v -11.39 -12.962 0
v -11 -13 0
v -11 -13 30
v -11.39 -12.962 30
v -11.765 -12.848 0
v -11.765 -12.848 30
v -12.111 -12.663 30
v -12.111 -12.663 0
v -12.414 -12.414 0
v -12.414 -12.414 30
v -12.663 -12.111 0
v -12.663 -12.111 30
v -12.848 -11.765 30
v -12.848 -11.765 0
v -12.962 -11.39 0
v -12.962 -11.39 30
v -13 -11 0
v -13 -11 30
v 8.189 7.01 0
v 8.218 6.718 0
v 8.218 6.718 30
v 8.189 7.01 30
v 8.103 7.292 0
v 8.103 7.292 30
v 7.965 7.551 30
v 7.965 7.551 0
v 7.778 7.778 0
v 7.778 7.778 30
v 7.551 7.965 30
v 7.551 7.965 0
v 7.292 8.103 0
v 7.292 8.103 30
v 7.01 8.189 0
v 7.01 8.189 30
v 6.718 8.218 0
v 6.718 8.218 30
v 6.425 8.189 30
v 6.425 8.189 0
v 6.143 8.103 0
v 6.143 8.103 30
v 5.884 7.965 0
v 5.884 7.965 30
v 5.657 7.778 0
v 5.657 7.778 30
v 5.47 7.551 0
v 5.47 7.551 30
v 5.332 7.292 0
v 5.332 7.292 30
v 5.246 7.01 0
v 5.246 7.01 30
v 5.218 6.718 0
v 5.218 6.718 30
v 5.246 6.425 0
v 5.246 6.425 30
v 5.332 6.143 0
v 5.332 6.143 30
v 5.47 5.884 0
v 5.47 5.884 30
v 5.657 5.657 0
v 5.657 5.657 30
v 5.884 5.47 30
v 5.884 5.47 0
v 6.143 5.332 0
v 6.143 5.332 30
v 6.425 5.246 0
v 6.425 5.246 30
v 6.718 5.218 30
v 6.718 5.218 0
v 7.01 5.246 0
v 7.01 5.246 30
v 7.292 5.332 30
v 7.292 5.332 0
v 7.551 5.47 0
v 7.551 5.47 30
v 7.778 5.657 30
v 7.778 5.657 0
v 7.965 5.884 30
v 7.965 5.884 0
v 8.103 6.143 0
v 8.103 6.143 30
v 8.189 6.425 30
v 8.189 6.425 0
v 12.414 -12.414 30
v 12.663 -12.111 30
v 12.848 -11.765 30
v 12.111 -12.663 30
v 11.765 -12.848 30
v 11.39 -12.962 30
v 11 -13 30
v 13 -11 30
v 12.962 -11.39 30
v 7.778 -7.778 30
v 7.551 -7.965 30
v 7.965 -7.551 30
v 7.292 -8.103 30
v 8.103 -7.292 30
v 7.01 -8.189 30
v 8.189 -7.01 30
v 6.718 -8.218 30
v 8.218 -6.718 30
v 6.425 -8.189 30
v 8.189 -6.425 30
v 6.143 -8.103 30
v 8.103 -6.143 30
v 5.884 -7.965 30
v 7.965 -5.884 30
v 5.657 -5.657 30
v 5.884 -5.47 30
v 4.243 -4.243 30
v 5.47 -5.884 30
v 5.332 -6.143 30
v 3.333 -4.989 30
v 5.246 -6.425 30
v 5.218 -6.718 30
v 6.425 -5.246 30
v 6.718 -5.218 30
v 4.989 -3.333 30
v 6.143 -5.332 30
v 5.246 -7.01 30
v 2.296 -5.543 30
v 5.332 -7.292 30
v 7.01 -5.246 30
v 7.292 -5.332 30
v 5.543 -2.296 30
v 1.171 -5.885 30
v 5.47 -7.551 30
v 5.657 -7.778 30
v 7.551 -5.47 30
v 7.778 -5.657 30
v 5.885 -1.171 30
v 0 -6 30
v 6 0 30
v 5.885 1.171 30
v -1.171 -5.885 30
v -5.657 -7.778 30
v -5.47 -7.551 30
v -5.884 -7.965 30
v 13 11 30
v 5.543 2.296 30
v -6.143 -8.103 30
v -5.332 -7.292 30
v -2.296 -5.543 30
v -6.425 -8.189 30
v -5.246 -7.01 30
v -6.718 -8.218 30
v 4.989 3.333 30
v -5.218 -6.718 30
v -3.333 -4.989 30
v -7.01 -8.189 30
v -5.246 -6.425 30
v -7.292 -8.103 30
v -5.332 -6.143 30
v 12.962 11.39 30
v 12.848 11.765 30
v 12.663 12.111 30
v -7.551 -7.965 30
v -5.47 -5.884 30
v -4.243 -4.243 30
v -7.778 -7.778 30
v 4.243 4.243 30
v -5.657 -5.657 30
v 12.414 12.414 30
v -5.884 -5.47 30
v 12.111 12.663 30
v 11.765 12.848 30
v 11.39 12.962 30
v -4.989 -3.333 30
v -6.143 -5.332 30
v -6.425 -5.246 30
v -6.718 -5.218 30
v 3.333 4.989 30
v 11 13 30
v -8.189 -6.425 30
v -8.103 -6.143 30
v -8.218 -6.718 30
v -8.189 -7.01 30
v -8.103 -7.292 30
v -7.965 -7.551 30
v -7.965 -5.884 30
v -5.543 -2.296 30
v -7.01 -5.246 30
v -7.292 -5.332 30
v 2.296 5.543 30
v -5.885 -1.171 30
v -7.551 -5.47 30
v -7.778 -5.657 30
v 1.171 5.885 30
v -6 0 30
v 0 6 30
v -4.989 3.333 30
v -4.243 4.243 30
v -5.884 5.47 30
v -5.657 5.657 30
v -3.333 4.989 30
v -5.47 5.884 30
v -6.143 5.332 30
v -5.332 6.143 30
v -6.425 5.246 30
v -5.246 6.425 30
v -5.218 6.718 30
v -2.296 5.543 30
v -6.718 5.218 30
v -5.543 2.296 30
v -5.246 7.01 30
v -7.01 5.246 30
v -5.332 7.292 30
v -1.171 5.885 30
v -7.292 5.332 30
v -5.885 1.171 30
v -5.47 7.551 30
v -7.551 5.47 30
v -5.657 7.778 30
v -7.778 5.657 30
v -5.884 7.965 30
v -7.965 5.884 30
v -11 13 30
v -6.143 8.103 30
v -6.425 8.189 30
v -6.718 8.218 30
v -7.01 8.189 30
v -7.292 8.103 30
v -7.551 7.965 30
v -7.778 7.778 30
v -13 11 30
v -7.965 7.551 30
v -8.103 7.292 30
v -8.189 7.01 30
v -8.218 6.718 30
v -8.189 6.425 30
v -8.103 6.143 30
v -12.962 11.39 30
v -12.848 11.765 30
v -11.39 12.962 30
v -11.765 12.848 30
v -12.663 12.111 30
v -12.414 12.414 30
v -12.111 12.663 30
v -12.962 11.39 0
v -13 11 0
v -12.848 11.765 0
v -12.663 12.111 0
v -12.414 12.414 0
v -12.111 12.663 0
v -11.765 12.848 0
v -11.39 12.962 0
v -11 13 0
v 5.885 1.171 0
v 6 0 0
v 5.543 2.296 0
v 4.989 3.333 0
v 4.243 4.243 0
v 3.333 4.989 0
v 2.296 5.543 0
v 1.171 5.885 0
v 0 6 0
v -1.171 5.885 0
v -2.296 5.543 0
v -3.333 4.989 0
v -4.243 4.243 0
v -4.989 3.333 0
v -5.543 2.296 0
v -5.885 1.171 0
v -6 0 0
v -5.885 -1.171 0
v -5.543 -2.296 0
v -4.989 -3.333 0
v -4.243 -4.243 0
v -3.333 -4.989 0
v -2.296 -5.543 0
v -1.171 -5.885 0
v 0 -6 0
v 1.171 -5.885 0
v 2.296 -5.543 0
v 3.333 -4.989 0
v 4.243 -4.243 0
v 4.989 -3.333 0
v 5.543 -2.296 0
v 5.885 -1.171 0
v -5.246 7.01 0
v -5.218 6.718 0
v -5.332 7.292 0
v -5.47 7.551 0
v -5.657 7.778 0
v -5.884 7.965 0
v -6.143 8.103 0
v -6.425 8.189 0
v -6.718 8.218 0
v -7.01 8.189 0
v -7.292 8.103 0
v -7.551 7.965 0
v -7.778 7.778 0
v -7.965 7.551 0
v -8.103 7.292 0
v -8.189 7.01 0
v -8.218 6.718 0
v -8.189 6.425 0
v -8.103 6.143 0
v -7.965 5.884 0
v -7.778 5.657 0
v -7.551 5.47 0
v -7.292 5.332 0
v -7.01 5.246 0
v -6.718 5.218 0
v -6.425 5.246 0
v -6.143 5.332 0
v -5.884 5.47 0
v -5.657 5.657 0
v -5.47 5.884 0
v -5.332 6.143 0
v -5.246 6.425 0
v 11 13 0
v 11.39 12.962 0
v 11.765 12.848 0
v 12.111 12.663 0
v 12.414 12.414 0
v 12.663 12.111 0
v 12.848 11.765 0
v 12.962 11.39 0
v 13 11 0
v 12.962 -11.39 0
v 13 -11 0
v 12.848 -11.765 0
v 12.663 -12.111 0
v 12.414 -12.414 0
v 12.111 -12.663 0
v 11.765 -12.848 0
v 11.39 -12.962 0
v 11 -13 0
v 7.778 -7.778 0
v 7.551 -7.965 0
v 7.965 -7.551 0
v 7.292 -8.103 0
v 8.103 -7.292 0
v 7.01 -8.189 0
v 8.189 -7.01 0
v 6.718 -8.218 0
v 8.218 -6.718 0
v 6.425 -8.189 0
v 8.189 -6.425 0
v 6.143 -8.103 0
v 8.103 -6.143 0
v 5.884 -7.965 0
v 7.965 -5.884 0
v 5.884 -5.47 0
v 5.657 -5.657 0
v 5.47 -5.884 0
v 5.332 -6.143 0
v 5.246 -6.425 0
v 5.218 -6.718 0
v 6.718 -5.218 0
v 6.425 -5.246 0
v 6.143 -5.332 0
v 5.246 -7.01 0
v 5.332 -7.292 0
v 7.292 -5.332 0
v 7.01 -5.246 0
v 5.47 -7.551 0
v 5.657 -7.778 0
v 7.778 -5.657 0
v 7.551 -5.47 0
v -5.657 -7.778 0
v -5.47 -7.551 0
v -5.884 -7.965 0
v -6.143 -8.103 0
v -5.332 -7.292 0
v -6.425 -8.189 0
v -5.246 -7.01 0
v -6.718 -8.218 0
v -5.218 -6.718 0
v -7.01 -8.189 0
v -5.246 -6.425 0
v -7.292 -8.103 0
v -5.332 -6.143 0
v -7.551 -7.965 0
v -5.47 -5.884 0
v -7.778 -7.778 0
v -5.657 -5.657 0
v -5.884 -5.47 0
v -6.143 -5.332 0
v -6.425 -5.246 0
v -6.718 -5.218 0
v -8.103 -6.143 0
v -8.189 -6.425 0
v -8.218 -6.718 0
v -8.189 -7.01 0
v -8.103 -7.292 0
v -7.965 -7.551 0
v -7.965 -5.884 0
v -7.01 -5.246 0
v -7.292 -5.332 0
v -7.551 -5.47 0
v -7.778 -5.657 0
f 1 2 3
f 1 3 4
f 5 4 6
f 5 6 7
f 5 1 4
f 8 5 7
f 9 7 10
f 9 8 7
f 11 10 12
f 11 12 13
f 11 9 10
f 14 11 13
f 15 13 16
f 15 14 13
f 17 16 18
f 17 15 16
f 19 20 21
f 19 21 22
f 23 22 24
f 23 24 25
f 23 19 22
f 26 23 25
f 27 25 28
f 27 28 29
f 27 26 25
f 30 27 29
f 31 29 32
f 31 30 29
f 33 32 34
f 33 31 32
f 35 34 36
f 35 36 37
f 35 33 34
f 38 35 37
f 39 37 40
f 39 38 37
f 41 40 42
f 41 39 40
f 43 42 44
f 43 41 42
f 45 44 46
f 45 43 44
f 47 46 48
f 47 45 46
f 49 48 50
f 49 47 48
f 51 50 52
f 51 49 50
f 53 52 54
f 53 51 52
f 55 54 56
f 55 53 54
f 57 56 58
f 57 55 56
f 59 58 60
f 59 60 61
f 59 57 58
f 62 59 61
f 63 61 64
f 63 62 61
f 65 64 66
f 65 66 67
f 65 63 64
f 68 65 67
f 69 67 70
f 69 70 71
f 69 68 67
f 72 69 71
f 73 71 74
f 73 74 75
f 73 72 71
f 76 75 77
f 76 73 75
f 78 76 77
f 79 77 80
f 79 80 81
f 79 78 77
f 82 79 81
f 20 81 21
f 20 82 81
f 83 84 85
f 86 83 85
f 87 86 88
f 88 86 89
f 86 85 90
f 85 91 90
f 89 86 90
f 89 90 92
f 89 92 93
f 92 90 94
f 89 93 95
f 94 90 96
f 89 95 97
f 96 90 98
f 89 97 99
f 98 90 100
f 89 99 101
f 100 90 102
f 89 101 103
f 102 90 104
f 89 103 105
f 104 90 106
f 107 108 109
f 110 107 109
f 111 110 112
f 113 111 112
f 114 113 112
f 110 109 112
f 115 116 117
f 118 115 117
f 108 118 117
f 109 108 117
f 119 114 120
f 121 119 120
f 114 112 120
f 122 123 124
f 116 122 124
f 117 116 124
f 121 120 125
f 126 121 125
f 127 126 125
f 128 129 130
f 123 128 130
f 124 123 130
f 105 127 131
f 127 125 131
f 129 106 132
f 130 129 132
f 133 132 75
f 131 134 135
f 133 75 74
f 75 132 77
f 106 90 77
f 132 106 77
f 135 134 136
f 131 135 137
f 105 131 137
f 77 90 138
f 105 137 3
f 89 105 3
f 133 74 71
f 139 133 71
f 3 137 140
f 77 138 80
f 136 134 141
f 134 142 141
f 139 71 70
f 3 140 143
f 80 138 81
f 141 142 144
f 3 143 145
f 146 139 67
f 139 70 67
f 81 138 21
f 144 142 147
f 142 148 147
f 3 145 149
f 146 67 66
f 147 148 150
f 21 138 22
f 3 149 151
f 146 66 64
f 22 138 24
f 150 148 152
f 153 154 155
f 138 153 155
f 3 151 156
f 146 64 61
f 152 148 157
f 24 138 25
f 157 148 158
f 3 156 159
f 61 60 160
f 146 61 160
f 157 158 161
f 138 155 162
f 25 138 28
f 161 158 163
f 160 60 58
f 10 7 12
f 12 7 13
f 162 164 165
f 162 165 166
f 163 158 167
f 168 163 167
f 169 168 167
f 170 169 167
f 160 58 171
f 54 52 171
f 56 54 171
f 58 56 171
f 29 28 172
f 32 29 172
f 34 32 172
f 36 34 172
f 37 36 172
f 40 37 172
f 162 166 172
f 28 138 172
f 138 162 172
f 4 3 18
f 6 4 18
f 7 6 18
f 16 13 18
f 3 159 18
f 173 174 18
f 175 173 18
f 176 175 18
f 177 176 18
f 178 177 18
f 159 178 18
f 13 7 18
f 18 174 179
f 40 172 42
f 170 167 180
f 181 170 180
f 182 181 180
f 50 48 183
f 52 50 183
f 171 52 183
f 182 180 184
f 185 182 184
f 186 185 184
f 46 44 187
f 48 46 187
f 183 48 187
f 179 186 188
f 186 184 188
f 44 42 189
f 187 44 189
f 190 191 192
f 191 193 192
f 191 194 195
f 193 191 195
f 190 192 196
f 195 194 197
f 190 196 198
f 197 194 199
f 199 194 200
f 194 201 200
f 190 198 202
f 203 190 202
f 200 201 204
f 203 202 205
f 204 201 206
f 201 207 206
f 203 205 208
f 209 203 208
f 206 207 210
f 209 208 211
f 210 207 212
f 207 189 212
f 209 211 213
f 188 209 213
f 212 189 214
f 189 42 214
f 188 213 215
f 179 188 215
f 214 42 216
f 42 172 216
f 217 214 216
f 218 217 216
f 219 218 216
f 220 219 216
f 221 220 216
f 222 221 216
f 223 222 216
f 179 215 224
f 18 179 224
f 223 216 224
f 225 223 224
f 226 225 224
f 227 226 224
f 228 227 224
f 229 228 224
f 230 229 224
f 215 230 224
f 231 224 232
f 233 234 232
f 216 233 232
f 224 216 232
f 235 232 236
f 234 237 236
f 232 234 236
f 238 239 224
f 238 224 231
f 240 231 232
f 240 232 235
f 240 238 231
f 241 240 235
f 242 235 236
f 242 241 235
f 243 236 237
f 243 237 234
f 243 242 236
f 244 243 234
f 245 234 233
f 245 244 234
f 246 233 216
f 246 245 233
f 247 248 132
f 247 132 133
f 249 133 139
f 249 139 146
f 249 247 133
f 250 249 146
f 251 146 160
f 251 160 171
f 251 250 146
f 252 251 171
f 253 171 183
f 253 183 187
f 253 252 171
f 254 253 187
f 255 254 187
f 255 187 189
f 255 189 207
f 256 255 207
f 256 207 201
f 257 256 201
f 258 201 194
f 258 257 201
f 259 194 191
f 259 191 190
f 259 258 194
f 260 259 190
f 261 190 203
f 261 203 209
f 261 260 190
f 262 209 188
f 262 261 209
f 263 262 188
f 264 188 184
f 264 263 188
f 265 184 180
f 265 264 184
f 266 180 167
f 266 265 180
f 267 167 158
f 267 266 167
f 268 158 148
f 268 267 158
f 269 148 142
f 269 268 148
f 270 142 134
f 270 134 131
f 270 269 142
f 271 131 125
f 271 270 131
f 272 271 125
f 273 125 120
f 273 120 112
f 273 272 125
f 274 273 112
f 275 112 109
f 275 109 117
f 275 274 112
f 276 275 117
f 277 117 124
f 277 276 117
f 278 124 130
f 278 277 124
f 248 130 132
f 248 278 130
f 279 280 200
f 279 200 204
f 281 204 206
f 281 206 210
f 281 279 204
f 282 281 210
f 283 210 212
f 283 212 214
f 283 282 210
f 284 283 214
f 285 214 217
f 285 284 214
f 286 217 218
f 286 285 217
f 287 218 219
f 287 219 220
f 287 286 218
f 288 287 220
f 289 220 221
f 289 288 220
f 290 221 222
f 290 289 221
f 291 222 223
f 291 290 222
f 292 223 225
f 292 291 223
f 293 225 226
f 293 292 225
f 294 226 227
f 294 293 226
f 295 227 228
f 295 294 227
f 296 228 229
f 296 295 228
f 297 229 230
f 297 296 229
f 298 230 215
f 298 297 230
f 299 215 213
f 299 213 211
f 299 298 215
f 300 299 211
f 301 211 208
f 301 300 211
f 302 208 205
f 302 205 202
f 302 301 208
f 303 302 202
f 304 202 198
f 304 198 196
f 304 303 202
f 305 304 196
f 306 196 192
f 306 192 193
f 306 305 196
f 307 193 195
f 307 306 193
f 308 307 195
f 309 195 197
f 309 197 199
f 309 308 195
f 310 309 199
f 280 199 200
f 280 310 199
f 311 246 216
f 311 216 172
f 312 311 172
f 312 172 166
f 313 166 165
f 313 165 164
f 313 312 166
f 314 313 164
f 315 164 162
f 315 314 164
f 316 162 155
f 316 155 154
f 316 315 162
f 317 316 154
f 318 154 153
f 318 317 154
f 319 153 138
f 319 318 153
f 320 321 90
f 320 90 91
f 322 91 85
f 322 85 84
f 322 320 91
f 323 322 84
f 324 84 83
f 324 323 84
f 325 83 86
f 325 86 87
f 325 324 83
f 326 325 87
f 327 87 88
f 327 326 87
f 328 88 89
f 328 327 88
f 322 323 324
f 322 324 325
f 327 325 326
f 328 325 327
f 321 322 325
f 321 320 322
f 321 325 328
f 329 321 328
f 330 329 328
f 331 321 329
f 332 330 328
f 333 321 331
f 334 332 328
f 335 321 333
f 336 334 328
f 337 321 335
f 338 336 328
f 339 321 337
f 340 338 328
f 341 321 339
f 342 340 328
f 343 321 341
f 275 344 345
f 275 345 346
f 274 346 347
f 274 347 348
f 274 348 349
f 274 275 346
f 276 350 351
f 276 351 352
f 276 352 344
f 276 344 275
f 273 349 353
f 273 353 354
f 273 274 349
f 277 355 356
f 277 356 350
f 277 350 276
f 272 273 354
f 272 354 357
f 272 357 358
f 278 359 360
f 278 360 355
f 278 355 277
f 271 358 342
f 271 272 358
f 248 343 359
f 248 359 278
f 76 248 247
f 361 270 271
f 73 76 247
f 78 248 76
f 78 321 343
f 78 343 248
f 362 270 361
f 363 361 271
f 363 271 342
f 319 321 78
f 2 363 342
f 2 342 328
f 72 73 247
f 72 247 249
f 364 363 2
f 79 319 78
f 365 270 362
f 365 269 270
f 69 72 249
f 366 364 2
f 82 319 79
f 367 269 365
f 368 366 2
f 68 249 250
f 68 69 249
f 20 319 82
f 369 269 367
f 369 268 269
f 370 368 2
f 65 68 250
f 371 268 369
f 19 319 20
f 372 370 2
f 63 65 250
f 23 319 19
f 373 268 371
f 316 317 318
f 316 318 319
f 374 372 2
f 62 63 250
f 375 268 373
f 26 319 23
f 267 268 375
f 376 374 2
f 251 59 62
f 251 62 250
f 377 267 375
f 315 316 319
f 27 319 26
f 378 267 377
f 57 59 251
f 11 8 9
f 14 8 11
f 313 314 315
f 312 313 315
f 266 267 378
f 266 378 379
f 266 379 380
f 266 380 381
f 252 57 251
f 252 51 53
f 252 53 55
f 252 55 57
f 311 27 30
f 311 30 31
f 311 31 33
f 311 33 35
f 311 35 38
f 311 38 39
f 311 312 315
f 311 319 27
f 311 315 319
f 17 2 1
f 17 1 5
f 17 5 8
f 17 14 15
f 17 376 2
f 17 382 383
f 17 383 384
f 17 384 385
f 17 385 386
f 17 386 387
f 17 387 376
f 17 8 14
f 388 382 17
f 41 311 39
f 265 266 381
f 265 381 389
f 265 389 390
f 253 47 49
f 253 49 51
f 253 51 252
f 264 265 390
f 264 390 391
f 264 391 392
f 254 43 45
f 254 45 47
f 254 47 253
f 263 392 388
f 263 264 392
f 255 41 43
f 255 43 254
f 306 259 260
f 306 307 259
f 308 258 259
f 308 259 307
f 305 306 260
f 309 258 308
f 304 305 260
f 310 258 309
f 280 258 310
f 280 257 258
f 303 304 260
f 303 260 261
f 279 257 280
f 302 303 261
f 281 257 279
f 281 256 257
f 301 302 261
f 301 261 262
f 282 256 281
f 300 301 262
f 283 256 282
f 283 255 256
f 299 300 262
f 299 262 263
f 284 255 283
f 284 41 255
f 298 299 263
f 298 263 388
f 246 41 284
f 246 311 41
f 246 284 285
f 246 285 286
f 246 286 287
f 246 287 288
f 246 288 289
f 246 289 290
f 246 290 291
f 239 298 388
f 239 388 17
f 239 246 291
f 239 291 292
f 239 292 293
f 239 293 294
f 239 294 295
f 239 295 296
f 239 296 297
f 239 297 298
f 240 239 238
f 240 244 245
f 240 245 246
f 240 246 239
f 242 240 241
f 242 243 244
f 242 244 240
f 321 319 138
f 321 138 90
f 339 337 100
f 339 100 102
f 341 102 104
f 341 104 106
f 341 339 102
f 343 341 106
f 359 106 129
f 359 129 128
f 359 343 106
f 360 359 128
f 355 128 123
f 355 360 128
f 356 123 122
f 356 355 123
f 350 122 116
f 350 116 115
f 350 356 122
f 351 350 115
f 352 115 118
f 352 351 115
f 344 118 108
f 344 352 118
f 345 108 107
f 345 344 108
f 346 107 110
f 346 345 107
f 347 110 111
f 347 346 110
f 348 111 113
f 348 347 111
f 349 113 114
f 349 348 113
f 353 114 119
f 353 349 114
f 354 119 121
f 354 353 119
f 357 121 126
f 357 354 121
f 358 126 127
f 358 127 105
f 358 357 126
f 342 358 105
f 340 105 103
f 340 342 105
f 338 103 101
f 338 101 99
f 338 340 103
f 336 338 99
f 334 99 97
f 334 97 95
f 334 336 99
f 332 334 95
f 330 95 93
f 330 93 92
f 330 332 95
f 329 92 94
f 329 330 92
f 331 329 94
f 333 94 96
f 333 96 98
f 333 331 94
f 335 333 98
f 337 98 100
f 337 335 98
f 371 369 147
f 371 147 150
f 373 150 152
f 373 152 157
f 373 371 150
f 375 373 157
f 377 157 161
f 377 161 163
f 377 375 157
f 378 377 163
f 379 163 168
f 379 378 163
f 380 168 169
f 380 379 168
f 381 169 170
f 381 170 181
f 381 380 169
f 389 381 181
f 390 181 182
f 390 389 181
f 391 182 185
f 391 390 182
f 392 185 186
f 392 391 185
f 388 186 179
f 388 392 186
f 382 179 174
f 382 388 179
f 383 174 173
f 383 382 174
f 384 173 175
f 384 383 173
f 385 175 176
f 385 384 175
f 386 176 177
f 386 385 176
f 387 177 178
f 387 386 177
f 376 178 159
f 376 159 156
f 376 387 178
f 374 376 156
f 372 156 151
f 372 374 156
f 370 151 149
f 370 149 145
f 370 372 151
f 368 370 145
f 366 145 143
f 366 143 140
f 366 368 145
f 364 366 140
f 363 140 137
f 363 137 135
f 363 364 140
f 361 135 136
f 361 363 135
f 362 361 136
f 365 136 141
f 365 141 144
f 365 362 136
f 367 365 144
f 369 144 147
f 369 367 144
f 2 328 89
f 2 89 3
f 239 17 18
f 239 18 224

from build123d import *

# Parameters (mm, degrees)
SKETCH_1_R      = 1.5
SKETCH_1_R_2    = 6
EXTRUDE_1_DEPTH = 30


with BuildPart() as part:
    # 草图1 → 凸台-拉伸1 (new body)
    with BuildSketch(Plane.XY):
        with BuildLine():
            Line((0, 13), (11, 13))
            ThreePointArc((11, 13), (12.414213562, 12.414213562), (13, 11))
            Line((13, 11), (13, -11))
            ThreePointArc((13, -11), (12.414213562, -12.414213562), (11, -13))
            Line((11, -13), (-11, -13))
            ThreePointArc((-11, -13), (-12.414213562, -12.414213562), (-13, -11))
            Line((-13, -11), (-13, 11))
            ThreePointArc((-13, 11), (-12.414213562, 12.414213562), (-11, 13))
            Line((-11, 13), (0, 13))
        make_face()
        with Locations((-6.717514421, 6.717514421)):
            Circle(SKETCH_1_R, mode=Mode.SUBTRACT)
        with Locations((6.717514421, 6.717514421)):
            Circle(SKETCH_1_R, mode=Mode.SUBTRACT)
        with Locations((-6.717514421, -6.717514421)):
            Circle(SKETCH_1_R, mode=Mode.SUBTRACT)
        with Locations((6.717514421, -6.717514421)):
            Circle(SKETCH_1_R, mode=Mode.SUBTRACT)
        Circle(SKETCH_1_R_2, mode=Mode.SUBTRACT)
    extrude(amount=EXTRUDE_1_DEPTH)


solid = part.part
